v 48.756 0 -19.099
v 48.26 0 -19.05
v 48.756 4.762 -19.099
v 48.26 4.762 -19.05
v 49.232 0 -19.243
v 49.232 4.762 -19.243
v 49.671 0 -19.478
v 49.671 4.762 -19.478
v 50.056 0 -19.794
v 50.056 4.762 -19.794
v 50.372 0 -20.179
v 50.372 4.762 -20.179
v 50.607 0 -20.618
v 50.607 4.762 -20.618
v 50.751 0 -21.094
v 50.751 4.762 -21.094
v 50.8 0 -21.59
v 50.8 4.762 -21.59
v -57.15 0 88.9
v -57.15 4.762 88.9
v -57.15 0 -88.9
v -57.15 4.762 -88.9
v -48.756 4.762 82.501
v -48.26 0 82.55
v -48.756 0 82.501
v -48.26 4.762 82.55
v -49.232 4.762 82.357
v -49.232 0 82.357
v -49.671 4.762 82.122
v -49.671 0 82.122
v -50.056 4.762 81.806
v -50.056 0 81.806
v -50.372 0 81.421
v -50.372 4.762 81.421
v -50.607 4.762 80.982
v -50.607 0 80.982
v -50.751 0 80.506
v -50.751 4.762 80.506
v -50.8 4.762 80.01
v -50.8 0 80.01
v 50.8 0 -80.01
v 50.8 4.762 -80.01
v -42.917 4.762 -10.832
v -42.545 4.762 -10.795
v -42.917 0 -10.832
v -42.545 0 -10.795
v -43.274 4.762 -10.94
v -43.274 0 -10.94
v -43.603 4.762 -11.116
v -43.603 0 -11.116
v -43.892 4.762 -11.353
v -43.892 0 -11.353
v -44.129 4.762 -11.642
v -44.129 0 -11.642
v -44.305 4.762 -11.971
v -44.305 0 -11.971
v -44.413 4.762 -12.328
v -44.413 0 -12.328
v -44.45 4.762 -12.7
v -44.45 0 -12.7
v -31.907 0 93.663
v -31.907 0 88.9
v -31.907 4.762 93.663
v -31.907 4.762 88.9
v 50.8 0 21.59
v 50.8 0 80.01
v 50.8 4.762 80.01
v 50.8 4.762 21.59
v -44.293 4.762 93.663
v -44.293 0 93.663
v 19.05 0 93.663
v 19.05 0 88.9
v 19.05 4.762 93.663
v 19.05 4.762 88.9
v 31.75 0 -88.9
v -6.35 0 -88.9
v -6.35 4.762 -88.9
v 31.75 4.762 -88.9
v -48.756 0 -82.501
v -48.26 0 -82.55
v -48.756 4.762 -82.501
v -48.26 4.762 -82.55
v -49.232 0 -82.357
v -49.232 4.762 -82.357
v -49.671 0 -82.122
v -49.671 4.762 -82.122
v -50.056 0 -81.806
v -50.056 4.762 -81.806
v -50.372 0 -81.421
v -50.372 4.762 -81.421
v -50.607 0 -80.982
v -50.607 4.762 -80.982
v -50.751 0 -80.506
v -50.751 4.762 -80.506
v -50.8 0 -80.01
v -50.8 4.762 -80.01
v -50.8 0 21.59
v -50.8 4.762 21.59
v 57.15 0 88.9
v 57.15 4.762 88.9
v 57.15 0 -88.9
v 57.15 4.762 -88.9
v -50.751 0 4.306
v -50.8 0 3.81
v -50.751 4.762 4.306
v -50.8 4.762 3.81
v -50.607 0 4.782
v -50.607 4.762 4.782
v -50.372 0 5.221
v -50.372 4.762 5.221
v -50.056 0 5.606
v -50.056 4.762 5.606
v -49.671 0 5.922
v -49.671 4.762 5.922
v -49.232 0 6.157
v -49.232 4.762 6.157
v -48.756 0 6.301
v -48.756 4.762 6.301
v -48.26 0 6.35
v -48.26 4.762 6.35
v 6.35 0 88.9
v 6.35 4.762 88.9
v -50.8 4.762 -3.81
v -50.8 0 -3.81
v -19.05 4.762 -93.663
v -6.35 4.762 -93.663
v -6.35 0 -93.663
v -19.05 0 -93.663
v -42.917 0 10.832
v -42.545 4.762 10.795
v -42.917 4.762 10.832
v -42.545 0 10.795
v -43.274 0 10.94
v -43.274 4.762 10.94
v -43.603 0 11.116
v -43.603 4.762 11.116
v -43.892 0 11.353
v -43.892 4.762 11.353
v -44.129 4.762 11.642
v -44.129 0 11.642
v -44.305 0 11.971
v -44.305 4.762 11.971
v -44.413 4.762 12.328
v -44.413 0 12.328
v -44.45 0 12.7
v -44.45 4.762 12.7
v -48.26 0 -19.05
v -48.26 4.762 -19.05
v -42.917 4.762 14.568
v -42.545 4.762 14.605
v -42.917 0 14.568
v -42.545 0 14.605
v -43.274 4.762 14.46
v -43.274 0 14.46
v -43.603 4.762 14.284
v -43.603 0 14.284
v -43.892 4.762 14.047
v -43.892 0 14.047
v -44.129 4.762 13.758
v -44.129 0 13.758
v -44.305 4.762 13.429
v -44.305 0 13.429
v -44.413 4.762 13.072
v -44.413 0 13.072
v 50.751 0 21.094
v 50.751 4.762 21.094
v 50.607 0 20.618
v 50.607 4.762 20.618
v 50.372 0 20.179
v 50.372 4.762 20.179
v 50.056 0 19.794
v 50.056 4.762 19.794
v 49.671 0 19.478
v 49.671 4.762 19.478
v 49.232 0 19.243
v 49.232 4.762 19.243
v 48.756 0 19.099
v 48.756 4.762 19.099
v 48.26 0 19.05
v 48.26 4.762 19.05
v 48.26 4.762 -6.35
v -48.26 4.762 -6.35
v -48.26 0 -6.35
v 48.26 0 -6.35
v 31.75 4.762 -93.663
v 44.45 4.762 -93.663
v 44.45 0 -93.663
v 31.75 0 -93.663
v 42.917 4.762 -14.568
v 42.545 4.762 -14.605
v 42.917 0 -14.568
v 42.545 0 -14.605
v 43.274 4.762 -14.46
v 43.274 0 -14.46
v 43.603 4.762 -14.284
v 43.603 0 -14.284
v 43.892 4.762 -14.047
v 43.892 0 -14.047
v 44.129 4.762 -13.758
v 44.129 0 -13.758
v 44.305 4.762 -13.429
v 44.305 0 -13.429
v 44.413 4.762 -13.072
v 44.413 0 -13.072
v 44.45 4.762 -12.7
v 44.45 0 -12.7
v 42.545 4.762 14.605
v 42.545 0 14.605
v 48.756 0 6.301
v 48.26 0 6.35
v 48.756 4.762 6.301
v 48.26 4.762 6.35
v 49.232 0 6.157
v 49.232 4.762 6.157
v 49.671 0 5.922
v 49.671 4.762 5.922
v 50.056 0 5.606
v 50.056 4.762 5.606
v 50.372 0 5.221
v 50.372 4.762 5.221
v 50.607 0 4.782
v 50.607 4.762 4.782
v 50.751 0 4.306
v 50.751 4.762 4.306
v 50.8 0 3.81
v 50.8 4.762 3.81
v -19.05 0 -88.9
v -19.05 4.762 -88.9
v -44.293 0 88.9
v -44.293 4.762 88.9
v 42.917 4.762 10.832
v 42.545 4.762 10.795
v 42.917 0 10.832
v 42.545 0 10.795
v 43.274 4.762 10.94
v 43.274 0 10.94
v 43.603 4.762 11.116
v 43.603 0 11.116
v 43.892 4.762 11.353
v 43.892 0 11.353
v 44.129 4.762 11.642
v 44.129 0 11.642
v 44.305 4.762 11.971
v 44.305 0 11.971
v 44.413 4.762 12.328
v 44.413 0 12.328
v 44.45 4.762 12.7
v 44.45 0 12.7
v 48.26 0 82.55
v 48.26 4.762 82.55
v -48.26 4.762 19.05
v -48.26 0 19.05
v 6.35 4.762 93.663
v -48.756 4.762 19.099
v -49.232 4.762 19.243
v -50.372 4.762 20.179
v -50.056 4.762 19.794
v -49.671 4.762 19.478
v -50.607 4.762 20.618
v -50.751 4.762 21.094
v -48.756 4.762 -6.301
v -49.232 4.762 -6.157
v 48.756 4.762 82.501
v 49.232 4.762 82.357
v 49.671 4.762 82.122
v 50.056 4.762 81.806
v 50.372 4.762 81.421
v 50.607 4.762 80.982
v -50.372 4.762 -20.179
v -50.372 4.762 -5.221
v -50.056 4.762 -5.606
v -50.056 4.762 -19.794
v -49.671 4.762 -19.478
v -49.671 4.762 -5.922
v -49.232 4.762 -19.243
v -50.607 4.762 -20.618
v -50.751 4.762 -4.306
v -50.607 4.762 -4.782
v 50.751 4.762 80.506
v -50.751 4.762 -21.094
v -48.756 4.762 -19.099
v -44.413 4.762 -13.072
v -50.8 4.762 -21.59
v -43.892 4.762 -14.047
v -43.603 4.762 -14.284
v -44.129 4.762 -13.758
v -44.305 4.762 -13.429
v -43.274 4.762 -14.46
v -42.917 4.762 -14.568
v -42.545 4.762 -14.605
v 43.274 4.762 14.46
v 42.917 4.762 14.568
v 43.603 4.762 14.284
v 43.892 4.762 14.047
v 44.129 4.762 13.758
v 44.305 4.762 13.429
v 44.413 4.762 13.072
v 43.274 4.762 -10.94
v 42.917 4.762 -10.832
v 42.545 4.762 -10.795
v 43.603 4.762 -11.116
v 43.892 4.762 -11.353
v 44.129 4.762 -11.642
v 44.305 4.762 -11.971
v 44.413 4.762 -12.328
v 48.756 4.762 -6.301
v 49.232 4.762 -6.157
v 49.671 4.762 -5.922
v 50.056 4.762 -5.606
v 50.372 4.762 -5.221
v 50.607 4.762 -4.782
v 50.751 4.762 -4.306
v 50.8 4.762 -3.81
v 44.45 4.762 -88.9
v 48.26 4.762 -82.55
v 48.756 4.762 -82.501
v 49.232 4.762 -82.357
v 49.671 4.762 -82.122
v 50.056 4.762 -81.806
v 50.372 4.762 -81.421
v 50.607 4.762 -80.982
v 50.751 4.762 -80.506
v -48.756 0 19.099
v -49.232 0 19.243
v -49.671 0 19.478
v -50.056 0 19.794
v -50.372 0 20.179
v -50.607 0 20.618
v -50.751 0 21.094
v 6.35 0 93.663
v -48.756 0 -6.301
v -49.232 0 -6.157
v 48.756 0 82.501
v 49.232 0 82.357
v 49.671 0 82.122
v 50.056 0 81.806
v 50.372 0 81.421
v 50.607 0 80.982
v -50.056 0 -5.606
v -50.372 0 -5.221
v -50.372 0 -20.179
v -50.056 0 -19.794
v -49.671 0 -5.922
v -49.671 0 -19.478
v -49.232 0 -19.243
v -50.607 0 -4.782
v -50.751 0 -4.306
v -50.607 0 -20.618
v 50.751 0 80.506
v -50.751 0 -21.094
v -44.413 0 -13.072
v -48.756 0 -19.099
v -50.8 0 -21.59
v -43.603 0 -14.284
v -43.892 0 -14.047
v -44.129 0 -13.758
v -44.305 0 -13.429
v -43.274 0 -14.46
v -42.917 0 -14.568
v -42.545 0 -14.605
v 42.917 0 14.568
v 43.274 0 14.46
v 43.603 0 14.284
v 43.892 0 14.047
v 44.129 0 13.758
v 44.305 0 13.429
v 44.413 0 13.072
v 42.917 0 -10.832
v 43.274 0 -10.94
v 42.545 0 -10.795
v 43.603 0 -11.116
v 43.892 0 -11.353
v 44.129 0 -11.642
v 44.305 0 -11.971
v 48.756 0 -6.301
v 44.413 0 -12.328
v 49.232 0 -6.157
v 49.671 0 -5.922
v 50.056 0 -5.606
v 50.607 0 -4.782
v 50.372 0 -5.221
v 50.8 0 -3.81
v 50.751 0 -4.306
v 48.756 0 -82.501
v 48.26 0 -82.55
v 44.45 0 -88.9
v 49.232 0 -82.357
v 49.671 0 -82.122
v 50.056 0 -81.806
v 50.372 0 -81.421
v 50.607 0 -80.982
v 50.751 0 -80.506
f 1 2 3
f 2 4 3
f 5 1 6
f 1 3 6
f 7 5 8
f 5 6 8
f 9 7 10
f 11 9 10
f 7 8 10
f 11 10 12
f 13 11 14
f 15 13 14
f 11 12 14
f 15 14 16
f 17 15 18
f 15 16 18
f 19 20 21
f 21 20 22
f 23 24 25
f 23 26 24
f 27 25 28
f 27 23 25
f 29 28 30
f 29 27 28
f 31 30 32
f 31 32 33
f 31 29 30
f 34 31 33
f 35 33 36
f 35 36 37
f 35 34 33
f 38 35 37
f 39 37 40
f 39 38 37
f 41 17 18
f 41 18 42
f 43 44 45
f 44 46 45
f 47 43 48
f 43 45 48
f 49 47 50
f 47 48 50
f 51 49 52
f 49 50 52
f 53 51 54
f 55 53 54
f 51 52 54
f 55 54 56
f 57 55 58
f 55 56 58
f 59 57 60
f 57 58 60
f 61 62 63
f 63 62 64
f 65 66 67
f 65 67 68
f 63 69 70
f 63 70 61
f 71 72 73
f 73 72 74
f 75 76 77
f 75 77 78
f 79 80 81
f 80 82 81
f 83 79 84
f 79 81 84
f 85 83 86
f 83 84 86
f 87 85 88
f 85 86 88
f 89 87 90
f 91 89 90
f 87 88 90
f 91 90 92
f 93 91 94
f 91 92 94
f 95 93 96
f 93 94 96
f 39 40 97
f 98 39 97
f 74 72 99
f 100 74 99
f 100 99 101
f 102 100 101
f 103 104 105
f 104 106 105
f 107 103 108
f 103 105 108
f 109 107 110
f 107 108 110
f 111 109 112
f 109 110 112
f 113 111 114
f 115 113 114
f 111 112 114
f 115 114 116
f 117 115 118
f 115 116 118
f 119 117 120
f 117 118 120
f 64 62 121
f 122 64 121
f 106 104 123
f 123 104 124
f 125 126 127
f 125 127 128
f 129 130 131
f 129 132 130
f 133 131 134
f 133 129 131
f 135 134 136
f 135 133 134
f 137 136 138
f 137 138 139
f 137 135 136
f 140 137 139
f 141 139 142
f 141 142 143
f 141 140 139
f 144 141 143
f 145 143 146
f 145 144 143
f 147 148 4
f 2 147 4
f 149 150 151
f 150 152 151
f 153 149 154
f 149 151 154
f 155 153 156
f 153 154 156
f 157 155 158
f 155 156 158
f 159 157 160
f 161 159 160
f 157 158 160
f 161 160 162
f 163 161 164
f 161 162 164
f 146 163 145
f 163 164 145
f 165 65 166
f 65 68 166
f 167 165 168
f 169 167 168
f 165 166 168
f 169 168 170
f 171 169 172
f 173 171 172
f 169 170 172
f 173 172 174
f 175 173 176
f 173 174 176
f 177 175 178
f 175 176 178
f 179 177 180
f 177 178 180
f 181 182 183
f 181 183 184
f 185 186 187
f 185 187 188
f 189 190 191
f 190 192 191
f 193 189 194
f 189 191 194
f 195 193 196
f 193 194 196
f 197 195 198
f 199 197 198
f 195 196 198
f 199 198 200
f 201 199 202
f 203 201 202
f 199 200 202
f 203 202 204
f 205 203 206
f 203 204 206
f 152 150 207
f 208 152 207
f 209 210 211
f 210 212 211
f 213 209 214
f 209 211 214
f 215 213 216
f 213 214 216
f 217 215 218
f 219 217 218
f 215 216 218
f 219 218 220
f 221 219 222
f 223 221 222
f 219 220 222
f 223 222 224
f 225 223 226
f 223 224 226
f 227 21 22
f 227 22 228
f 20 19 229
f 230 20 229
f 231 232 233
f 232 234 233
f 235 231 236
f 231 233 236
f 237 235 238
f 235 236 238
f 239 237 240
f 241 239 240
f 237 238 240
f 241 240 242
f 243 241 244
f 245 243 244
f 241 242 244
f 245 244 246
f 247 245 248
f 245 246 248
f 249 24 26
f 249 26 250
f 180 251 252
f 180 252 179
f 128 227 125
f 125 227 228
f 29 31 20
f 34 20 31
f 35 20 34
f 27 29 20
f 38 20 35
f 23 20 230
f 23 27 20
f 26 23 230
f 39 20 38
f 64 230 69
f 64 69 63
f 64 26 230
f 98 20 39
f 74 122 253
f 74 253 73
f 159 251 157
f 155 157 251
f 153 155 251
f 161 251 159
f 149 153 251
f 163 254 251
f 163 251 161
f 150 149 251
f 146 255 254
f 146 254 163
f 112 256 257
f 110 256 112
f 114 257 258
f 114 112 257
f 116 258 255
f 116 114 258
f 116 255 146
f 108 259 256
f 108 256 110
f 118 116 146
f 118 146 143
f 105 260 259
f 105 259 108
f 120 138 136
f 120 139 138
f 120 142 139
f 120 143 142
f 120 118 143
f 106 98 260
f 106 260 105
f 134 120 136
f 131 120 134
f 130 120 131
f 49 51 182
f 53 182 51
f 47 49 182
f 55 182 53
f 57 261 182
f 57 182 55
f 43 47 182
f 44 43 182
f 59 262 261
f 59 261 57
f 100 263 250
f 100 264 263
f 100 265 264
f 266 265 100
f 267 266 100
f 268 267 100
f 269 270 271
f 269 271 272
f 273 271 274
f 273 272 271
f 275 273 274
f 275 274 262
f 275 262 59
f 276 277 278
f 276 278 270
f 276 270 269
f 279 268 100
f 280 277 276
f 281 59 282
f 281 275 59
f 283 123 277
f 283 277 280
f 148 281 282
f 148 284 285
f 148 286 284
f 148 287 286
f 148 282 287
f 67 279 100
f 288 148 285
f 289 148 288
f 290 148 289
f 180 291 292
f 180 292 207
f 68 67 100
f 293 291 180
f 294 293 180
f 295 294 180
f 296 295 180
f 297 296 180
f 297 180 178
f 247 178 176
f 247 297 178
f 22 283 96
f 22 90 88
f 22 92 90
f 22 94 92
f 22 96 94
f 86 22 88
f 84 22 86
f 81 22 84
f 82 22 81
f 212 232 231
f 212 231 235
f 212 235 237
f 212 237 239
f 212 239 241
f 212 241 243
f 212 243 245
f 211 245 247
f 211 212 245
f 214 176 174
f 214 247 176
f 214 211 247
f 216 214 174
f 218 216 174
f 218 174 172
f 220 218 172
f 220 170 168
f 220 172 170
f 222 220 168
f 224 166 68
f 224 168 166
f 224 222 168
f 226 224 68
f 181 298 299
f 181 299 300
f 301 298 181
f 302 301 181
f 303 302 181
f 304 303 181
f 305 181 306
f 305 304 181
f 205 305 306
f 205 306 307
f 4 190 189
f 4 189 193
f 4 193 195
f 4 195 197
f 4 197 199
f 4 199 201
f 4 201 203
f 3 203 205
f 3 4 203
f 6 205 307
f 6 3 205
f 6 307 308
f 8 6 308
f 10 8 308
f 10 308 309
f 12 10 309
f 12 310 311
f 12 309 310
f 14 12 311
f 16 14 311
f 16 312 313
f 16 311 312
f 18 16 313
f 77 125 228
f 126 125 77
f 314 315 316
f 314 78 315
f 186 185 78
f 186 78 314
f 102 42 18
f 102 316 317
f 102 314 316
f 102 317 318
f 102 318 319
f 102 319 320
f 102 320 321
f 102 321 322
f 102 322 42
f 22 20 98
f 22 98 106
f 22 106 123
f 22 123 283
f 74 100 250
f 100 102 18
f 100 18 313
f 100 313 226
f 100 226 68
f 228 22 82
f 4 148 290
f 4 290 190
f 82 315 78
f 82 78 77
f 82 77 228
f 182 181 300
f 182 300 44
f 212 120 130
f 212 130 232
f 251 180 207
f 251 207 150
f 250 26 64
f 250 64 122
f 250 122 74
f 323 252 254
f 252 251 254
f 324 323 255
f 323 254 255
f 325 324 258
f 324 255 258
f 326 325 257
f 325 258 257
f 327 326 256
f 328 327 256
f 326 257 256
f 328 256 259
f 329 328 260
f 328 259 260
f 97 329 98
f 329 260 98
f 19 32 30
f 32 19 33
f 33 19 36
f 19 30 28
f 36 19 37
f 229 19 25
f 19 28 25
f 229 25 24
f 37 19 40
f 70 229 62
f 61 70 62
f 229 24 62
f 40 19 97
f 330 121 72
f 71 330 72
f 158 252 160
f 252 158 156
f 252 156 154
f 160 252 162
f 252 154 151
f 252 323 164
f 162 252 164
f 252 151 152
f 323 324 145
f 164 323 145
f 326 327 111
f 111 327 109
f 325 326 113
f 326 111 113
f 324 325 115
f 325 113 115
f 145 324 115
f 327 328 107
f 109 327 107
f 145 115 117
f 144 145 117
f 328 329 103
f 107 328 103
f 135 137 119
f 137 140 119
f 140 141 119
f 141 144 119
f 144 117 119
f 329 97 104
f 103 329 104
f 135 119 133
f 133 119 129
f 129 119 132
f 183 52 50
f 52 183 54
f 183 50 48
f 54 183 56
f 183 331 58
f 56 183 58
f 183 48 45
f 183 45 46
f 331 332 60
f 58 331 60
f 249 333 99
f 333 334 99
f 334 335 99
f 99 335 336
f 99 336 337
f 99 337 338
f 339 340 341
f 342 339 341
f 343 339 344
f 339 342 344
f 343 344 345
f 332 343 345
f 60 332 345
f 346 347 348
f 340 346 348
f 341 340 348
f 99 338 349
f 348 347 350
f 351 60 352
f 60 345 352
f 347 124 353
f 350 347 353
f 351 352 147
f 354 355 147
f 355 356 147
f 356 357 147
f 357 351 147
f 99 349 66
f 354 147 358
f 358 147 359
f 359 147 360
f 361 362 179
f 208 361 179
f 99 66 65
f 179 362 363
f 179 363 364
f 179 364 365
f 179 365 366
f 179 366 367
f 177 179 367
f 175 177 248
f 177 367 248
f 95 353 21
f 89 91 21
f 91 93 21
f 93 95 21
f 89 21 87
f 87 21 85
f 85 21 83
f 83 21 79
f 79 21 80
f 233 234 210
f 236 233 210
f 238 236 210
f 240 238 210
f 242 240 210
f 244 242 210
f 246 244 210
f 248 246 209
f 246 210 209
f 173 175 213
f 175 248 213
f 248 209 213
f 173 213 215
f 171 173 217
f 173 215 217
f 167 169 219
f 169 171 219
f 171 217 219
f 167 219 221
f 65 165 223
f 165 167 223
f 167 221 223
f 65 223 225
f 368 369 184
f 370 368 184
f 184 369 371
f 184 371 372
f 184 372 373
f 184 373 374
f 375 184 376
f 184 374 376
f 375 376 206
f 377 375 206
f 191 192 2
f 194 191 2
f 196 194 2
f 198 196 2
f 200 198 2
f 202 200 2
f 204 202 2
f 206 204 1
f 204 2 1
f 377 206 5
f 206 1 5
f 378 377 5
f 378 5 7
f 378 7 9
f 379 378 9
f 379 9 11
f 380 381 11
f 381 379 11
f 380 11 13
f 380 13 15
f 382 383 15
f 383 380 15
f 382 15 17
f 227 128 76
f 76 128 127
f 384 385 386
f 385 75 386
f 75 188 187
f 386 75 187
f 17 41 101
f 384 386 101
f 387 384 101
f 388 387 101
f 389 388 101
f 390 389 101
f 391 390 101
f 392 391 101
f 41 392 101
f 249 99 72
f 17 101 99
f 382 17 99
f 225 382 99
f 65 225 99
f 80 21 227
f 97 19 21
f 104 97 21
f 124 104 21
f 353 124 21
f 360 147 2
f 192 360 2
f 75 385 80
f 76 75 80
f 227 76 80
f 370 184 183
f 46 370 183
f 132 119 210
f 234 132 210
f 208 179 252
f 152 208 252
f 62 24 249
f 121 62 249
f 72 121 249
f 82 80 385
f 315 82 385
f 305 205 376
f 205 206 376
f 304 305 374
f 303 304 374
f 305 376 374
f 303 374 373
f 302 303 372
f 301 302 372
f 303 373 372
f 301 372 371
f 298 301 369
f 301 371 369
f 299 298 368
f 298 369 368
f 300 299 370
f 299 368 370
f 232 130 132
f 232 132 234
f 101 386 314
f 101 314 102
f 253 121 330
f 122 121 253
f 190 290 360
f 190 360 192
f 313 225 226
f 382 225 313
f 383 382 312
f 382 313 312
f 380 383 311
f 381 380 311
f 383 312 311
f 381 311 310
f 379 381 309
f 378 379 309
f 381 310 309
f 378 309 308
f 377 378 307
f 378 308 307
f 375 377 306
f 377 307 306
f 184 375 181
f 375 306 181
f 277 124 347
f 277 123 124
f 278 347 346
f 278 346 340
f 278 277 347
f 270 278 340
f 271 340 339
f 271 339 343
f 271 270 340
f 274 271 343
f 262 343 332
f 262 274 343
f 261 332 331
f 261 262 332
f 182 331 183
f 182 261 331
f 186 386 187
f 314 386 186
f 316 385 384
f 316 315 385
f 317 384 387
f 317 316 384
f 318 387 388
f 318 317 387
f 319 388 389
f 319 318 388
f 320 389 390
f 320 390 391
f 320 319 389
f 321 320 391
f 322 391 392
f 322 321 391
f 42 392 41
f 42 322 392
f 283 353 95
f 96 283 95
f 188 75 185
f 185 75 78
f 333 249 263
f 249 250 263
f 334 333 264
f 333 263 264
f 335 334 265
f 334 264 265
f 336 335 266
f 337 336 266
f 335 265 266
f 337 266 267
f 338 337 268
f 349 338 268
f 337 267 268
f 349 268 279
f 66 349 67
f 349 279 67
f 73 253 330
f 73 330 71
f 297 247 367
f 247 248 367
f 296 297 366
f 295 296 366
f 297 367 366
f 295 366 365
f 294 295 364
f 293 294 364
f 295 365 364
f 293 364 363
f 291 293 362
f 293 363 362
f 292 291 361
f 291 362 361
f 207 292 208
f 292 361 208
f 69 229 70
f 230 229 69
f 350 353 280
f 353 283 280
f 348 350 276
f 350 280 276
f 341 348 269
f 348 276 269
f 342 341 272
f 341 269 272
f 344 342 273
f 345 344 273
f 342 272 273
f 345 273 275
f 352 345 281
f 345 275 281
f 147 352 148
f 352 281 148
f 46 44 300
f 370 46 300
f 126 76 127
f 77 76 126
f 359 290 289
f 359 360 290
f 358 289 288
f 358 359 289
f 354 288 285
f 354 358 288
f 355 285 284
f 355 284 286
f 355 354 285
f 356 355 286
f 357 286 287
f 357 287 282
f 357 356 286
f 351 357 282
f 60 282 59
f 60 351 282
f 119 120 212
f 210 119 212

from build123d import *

# Parameters (mm, degrees)
SKETCH1_W           = 114.3
SKETCH1_H           = 177.8
SKETCH1_W_2         = 101.6
SKETCH1_H_2         = 165.1
BOSS_EXTRUDE1_DEPTH = 4.7625
SKETCH2_W           = 12.38677804
SKETCH2_H           = 4.7625
SKETCH2_W_2         = 12.7
BOSS_EXTRUDE2_DEPTH = 4.7625
SKETCH3_W           = 12.7
SKETCH3_H           = 4.7625
BOSS_EXTRUDE3_DEPTH = 4.7625
SKETCH7_W           = 114.3
SKETCH7_H           = 12.7
SKETCH7_W_2         = 88.9
SKETCH7_H_2         = 3.81
BOSS_EXTRUDE5_DEPTH = 4.7625
FILLET1_R           = 2.54
FILLET2_R           = 1.905


with BuildPart() as part:
    # Sketch1 → Boss-Extrude1 (new body)
    with BuildSketch(Plane(origin=(0, 0, 0), x_dir=(1, 0, 0), z_dir=(0, 1, 0))):
        Rectangle(SKETCH1_W, SKETCH1_H)
        Rectangle(SKETCH1_W_2, SKETCH1_H_2, mode=Mode.SUBTRACT)
    extrude(amount=BOSS_EXTRUDE1_DEPTH)

    # Sketch2 → Boss-Extrude2 (add)
    with BuildSketch(Plane.XY.offset(88.9)):
        with Locations((-38.1, 2.38125)):
            Rectangle(SKETCH2_W, SKETCH2_H)
        with Locations((12.7, 2.38125)):
            Rectangle(SKETCH2_W_2, SKETCH2_H)
    extrude(amount=BOSS_EXTRUDE2_DEPTH)

    # Sketch3 → Boss-Extrude3 (add)
    with BuildSketch(Plane(origin=(0, 0, -88.9), x_dir=(-1, 0, 0), z_dir=(0, 0, -1))):
        with Locations((-38.1, 2.38125)):
            Rectangle(SKETCH3_W, SKETCH3_H)
        with Locations((12.7, 2.38125)):
            Rectangle(SKETCH3_W, SKETCH3_H)
    extrude(amount=BOSS_EXTRUDE3_DEPTH)

    # Sketch7 → Boss-Extrude5 (add)
    # profile 1 of 2: a face of its own
    with BuildSketch(Plane(origin=(0, 4.7625, 0), x_dir=(1, 0, 0), z_dir=(0, 1, 0))):
        with Locations((0, 12.7)):
            Rectangle(SKETCH7_W, SKETCH7_H)
        with Locations((0, 12.7)):
            Rectangle(SKETCH7_W_2, SKETCH7_H_2, mode=Mode.SUBTRACT)
    # profile 2 of 2: a face of its own
    with BuildSketch(Plane(origin=(0, 4.7625, 0), x_dir=(1, 0, 0), z_dir=(0, 1, 0))):
        with Locations((0, -12.7)):
            Rectangle(SKETCH7_W, SKETCH7_H)
        with Locations((0, -12.7)):
            Rectangle(SKETCH7_W_2, SKETCH7_H_2, mode=Mode.SUBTRACT)
    extrude(amount=-BOSS_EXTRUDE5_DEPTH)

    # Fillet1
    fillet1_edges = [part.edges().sort_by_distance(p)[0] for p in [
        (50.8, 2.38125, -19.05),
        (50.8, 2.38125, -6.35),
        (-50.8, 2.38125, 19.05),
        (-50.8, 2.38125, 6.35),
        (50.8, 2.38125, 6.35),
        (50.8, 2.38125, 19.05),
        (50.8, 2.38125, 82.55),
        (50.8, 2.38125, -82.55),
        (-50.8, 2.38125, -82.55),
        (-50.8, 2.38125, 82.55),
        (-50.8, 2.38125, -6.35),
        (-50.8, 2.38125, -19.05),
    ]]
    fillet(fillet1_edges, radius=FILLET1_R)

    # Fillet2
    fillet2_edges = [part.edges().sort_by_distance(p)[0] for p in [
        (-44.45, 2.38125, -10.795),
        (-44.45, 2.38125, -14.605),
        (44.45, 2.38125, -10.795),
        (44.45, 2.38125, -14.605),
        (44.45, 2.38125, 14.605),
        (44.45, 2.38125, 10.795),
        (-44.45, 2.38125, 14.605),
        (-44.45, 2.38125, 10.795),
    ]]
    fillet(fillet2_edges, radius=FILLET2_R - 0.0001)  # a hair under: the kernel refuses the full size


solid = part.part
